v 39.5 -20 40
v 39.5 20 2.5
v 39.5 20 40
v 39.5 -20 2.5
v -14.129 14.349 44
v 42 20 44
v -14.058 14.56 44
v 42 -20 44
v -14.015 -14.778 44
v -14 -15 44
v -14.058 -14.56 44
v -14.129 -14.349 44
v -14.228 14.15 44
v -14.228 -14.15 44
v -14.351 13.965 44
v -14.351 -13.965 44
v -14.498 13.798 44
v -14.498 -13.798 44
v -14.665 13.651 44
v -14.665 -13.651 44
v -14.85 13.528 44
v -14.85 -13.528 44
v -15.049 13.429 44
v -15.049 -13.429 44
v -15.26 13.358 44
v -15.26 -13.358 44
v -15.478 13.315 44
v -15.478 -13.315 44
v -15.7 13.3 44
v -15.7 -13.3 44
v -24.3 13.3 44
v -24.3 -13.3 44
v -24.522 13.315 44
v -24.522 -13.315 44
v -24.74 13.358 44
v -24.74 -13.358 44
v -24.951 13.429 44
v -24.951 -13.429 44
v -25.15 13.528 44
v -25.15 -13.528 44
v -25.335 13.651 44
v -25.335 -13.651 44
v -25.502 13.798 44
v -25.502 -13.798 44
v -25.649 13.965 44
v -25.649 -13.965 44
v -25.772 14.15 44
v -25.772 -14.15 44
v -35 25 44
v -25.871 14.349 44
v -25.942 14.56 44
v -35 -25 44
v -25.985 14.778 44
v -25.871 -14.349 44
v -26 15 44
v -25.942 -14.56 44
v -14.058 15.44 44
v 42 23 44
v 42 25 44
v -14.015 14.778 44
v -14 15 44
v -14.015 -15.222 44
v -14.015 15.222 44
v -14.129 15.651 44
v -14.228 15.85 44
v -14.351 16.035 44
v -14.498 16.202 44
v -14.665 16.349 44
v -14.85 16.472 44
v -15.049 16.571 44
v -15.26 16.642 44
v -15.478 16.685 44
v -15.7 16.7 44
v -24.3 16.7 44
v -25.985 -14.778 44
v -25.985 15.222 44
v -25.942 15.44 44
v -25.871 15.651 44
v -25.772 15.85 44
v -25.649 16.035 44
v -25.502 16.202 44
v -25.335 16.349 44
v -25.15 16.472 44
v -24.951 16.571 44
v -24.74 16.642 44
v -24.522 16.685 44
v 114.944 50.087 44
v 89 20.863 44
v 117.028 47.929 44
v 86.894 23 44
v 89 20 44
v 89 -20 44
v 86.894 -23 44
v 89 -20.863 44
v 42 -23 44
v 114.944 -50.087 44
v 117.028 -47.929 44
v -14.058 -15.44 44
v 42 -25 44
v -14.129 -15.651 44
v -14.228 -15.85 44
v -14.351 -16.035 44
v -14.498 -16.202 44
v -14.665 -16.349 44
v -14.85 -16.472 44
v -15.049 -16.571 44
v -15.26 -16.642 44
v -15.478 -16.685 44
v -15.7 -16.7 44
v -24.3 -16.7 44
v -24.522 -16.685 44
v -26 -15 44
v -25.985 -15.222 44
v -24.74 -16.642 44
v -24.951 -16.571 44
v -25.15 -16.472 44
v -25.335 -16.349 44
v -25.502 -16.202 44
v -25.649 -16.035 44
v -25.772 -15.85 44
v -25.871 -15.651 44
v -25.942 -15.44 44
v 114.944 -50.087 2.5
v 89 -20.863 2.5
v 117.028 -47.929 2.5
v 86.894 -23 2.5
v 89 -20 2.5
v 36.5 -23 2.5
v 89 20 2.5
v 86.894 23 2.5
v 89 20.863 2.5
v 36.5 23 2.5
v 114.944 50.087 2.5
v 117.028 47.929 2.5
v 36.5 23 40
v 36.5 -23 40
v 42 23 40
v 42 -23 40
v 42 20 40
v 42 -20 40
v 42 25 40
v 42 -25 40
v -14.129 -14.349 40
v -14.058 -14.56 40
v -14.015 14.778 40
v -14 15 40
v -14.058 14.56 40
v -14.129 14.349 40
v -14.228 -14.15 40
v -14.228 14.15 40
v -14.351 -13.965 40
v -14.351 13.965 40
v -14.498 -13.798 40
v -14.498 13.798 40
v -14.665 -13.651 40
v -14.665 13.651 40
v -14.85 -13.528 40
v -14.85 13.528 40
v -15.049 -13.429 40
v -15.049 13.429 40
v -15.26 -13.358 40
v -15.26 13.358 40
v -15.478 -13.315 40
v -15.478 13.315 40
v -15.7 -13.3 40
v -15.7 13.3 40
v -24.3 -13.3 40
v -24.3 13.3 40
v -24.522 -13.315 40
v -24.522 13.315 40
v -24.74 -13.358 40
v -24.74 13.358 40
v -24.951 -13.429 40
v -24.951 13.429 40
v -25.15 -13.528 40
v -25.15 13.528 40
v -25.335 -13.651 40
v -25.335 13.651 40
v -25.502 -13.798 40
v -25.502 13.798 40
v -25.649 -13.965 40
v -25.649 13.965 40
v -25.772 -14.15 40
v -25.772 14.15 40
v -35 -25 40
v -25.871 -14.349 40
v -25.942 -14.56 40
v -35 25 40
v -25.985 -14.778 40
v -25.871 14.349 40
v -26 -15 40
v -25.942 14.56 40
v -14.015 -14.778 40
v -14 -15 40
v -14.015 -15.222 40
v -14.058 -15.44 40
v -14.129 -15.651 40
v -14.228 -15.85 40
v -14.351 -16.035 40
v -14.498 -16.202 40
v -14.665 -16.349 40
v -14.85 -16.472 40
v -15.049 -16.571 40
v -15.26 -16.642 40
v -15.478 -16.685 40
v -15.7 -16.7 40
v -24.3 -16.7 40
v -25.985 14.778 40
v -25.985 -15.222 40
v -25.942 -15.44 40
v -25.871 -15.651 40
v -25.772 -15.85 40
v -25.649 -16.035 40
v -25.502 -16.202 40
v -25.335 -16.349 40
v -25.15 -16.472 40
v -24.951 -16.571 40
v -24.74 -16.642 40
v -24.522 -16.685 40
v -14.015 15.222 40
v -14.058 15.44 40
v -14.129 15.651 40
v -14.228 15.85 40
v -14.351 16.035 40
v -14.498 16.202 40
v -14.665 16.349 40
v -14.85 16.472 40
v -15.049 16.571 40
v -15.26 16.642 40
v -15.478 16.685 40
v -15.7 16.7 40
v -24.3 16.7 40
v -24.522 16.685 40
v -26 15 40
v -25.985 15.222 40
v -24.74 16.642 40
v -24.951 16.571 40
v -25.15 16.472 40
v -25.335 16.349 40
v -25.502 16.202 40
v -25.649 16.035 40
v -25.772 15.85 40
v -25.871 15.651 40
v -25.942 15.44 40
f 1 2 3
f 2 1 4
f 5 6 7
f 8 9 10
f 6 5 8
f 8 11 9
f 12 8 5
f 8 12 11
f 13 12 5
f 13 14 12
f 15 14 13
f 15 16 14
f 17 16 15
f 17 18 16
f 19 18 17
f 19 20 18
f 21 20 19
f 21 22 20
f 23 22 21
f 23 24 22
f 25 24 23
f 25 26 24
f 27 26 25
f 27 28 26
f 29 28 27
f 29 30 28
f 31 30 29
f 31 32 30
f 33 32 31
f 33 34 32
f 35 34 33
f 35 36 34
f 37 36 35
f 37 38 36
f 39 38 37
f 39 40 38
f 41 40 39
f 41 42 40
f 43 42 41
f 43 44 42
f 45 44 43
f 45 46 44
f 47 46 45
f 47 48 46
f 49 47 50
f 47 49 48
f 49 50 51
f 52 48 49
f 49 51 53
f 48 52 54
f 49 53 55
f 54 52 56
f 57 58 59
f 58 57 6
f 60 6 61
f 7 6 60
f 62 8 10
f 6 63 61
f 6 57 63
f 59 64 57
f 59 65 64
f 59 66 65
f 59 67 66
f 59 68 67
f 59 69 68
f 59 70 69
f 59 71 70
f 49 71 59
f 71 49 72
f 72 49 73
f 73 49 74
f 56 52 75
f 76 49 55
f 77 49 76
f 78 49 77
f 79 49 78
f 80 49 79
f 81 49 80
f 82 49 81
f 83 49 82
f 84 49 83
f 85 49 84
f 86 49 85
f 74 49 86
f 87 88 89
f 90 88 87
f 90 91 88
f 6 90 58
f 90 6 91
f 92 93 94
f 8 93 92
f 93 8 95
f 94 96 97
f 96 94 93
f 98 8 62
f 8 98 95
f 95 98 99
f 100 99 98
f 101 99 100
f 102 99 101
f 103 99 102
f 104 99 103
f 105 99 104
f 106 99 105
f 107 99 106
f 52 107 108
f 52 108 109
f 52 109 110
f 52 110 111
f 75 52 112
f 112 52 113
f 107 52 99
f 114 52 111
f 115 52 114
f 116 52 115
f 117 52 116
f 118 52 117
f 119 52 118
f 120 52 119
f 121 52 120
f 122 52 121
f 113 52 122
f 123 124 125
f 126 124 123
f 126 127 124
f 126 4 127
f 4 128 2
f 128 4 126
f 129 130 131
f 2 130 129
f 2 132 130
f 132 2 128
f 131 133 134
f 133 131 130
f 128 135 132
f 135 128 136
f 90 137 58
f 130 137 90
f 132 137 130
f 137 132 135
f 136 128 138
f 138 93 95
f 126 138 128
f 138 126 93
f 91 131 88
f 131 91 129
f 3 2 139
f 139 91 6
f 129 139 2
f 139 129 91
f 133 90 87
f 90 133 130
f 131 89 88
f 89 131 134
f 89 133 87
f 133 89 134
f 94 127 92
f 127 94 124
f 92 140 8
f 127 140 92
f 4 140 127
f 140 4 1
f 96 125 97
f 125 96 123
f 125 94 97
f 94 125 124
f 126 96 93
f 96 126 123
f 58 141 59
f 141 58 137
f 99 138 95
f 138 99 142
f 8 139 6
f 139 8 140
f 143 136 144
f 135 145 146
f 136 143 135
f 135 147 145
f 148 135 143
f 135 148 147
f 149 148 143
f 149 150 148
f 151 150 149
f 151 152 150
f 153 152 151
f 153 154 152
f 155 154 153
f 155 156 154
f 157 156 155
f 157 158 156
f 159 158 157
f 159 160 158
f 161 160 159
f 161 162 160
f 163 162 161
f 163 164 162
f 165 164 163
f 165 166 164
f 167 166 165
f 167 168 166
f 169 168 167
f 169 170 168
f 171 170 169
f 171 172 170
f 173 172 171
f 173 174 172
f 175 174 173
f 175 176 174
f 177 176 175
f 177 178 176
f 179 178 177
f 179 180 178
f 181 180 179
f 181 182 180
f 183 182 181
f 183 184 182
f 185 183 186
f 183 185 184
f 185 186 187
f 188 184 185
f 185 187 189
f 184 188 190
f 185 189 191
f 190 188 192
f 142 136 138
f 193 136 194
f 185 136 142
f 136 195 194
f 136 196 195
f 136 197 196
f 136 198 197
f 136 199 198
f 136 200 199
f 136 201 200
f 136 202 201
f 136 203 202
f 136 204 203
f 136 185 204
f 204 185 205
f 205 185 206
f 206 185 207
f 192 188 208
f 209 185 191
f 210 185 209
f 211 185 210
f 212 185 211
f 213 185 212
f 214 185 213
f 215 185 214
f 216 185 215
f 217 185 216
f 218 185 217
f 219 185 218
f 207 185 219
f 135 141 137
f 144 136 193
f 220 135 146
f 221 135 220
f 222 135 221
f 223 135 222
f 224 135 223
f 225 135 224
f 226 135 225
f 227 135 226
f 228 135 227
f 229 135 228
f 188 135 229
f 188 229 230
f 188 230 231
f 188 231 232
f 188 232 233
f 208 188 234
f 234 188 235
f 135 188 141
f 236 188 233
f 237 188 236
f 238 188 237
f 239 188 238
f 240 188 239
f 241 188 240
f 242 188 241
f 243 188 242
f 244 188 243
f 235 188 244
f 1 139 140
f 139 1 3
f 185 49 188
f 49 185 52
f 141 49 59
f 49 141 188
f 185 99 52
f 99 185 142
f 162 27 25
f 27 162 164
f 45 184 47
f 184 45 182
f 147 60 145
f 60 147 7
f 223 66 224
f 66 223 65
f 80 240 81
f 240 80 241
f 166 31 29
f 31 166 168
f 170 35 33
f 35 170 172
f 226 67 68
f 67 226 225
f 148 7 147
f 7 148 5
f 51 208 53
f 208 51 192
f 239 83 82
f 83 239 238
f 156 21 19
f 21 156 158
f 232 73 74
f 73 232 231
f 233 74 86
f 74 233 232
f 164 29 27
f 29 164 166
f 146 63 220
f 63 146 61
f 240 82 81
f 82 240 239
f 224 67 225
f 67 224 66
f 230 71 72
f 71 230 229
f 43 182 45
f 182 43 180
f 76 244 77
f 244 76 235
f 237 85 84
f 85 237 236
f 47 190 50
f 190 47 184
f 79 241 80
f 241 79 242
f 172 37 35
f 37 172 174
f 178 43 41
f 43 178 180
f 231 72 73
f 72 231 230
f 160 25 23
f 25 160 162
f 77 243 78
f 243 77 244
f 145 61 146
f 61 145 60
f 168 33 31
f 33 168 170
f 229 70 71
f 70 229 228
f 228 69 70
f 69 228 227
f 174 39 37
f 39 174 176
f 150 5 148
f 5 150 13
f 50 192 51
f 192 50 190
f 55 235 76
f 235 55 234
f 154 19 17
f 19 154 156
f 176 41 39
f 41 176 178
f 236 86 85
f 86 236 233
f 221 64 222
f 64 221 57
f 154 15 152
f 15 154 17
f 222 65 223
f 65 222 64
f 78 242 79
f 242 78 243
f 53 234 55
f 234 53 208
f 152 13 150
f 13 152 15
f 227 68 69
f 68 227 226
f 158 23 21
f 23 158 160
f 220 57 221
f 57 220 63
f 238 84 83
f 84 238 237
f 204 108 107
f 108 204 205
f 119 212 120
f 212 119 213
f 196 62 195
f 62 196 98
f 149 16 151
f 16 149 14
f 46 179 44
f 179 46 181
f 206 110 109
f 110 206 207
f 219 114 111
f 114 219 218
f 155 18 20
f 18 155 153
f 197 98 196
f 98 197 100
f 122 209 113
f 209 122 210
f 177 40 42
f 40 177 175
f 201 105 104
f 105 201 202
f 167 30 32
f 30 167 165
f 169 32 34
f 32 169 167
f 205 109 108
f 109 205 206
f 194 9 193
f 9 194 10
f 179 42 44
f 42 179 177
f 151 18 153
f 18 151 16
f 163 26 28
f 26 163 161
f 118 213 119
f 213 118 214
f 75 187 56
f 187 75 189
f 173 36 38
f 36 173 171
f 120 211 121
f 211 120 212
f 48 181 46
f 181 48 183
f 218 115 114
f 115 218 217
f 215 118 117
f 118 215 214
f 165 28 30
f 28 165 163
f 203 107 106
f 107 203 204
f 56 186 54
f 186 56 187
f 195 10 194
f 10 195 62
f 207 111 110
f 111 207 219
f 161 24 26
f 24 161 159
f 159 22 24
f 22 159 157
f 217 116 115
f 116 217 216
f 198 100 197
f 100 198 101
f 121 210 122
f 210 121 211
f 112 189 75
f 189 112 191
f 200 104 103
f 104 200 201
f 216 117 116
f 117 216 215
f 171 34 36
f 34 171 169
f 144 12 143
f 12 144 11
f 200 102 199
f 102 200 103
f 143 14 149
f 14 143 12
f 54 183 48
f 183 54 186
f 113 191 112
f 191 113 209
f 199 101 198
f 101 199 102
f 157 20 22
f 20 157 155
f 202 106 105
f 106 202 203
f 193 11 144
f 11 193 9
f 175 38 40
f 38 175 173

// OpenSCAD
// Phineas/Ferb fixed scoop. Generated by generar_pala.py (same parameters); millimeters.
// x forward (0 = front edge of the chassis plate), y left, z up (0 = floor).
// Rotate 180 deg around X to print (the flat plate on the bed, walls upward, no supports).
$fn = 48;
difference() {
  union() {
    translate([38.000, 0.000, 23.250]) rotate([0, 0, 0.000]) cube([3.000, 46.000, 41.500], center = true);
    translate([63.500, 21.500, 23.250]) rotate([0, 0, 0.000]) cube([51.000, 3.000, 41.500], center = true);
    translate([101.743, 35.254, 23.250]) rotate([0, 0, 44.000]) cube([39.600, 3.000, 41.500], center = true);
    translate([63.500, -21.500, 23.250]) rotate([0, 0, 0.000]) cube([51.000, 3.000, 41.500], center = true);
    translate([101.743, -35.254, 23.250]) rotate([0, 0, -44.000]) cube([39.600, 3.000, 41.500], center = true);
    translate([3.500, 0.000, 42.000]) rotate([0, 0, 0.000]) cube([77.000, 50.000, 4.000], center = true);
    translate([87.500, 21.500, 2.500]) cylinder(h = 41.500, r = 1.500);
    translate([87.500, -21.500, 2.500]) cylinder(h = 41.500, r = 1.500);
  }
  translate([-20.000, 15.000, 39.000]) hull() { for (d = [-4.300, 4.300]) translate([d, 0, 0]) cylinder(h = 6.000, r = 1.700); }
  translate([-20.000, -15.000, 39.000]) hull() { for (d = [-4.300, 4.300]) translate([d, 0, 0]) cylinder(h = 6.000, r = 1.700); }
}
